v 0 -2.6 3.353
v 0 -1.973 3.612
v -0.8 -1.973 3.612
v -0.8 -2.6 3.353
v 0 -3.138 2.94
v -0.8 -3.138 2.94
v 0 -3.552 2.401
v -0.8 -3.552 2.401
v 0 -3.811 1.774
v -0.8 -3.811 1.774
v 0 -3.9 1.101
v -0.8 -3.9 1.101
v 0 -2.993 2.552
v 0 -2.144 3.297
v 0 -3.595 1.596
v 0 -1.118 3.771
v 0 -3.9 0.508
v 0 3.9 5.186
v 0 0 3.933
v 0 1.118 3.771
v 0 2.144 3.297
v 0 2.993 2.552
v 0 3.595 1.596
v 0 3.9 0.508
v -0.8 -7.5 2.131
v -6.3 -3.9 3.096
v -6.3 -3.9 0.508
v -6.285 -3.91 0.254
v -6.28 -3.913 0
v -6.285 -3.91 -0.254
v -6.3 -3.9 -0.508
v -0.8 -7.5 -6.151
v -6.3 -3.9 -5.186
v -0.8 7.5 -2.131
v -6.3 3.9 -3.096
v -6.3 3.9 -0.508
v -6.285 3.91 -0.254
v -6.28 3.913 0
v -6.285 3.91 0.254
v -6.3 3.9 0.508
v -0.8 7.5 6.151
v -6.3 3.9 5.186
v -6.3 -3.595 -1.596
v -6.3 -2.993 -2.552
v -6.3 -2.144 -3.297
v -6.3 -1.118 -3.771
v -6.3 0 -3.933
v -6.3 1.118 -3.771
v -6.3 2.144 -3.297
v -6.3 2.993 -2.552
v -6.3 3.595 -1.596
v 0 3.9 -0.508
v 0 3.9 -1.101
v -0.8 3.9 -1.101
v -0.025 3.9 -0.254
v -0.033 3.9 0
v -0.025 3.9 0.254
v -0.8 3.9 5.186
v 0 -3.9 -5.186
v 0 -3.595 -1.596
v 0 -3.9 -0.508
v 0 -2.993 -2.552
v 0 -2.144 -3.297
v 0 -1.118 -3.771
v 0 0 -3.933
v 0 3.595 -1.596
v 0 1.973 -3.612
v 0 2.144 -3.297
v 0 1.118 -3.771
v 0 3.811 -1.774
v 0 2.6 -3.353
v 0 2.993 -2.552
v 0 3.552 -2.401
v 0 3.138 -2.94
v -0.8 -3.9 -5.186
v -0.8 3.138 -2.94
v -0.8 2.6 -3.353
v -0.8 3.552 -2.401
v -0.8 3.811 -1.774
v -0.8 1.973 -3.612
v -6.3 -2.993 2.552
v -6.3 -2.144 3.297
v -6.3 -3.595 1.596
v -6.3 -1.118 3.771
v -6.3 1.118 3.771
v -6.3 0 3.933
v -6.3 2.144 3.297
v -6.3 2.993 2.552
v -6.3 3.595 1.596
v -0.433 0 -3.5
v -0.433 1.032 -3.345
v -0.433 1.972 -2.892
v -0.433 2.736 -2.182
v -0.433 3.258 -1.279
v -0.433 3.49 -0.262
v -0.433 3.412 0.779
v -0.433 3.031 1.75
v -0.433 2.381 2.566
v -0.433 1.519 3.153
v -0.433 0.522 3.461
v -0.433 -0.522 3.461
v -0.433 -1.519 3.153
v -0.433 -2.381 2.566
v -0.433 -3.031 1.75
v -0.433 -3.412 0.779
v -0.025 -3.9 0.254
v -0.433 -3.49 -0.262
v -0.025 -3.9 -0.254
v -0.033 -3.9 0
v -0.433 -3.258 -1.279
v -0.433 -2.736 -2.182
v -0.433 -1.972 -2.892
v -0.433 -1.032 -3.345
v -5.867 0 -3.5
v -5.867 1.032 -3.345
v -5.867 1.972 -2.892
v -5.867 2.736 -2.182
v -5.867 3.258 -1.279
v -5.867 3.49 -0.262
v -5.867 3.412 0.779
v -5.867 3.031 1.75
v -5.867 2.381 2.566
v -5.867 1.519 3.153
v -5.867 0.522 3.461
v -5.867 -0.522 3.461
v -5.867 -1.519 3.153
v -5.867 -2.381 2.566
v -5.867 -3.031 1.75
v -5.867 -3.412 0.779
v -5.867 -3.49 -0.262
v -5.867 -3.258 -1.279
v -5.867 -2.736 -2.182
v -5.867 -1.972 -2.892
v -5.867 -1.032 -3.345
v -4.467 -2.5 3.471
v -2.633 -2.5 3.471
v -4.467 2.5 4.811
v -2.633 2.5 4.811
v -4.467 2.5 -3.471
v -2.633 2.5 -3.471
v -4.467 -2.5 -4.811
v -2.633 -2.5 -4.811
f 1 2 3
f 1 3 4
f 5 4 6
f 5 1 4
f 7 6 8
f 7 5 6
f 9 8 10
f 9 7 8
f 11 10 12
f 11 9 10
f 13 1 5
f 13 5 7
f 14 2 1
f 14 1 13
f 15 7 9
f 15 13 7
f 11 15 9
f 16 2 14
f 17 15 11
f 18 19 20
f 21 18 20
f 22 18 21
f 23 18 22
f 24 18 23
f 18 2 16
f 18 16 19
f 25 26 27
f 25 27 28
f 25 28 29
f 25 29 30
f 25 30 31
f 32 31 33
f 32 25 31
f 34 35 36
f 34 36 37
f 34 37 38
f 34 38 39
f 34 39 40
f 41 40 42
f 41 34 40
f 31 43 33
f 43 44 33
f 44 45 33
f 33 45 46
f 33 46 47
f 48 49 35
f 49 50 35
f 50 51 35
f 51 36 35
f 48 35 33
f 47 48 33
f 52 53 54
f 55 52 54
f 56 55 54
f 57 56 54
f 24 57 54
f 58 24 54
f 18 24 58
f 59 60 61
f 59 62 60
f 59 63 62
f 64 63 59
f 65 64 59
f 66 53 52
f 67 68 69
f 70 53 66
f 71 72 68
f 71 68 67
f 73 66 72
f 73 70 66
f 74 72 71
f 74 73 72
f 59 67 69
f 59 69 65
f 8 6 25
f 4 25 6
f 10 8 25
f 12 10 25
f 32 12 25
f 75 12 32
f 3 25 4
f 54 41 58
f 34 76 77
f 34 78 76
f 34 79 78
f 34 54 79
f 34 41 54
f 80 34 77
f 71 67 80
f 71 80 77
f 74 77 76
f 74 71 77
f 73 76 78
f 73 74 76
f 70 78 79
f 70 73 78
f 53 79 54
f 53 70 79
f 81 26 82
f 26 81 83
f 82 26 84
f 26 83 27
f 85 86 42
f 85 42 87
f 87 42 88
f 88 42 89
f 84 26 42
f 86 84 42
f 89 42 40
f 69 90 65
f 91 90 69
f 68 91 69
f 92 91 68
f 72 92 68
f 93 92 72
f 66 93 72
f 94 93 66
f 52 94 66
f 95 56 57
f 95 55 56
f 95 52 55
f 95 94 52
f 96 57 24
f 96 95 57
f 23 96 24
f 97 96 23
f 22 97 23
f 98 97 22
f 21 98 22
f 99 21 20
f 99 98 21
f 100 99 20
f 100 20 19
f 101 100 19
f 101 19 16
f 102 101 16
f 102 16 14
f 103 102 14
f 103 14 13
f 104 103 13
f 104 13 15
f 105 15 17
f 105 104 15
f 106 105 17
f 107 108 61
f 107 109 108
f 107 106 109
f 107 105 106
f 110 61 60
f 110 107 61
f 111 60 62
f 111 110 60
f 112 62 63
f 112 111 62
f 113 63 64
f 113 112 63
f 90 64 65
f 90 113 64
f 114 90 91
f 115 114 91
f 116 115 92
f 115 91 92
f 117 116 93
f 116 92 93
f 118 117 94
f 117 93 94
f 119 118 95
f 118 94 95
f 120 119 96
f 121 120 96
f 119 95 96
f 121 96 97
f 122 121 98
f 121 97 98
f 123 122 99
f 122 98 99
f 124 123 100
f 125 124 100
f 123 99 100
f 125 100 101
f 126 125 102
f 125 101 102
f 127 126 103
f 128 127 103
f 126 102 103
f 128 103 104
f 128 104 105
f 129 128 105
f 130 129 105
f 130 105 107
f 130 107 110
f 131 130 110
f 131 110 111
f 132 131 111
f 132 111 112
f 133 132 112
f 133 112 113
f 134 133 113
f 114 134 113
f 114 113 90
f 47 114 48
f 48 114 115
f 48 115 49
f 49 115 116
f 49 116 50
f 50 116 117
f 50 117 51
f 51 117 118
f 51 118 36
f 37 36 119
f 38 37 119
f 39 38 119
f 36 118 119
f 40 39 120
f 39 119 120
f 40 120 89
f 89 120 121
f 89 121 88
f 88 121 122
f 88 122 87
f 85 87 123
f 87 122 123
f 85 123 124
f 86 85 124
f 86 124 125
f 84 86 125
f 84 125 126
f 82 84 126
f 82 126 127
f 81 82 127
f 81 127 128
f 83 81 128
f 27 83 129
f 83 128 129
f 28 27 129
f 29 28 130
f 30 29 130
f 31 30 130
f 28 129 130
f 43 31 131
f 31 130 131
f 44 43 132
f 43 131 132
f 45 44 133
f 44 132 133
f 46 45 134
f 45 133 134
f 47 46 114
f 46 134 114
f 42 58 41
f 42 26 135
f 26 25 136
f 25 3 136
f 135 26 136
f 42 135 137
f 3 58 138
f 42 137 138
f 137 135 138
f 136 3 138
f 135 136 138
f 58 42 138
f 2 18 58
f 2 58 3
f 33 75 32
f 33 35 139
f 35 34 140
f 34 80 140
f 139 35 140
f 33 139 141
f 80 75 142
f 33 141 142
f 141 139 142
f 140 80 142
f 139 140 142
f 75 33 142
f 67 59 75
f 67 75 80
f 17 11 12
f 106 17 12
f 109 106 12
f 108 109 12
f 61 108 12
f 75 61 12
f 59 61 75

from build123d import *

# Parameters (mm, degrees)
EXTRUDE1_DEPTH       = 0.8
EXTRUDE2_DEPTH       = 5.5
DRAFT1_ANGLE         = -33.206570315
DRAFT2_ANGLE         = -33.206570315
M6_CLEARANCE_HOLE1_D = 7
CHAMFER1_SIZE        = 0.433


with BuildPart() as part:
    # Sketch1 → Extrude1 (new body)
    with BuildSketch(Plane(origin=(0, 0, 0), x_dir=(0, 0, -1), z_dir=(1, 0, 0))):
        with BuildLine():
            Line((1.101052702, 3.9), (-5.186106572, 3.9))
            Line((-5.186106572, 3.9), (-3.612459851, -1.972929517))
            ThreePointArc((-3.612459851, -1.972929517), (-2.683832418, -3.362718685), (-1.101052702, -3.9))
            Line((-1.101052702, -3.9), (5.186106572, -3.9))
            Line((5.186106572, -3.9), (3.612459851, 1.972929517))
            ThreePointArc((3.612459851, 1.972929517), (2.683832418, 3.362718685), (1.101052702, 3.9))
        make_face()
    extrude(amount=-EXTRUDE1_DEPTH)

    # Sketch2 → Extrude2 (add)
    with BuildSketch(Plane.ZY.offset(0.8)):
        with BuildLine():
            Line((2.131485778, -7.5), (-6.150723665, -7.5))
            add(Edge.make_bspline(
                [(-2.131485778, 7.5), (-3.471231741, 2.5), (-4.810977703, -2.5), (-6.150723665, -7.5)],
                knots=[0, 0, 0, 0, 1, 1, 1, 1], degree=3))
            Line((-2.131485778, 7.5), (6.150723665, 7.5))
            add(Edge.make_bspline(
                [(2.131485778, -7.5), (3.471231741, -2.5), (4.810977703, 2.5), (6.150723665, 7.5)],
                knots=[0, 0, 0, 0, 1, 1, 1, 1], degree=3))
        make_face()
    extrude(amount=EXTRUDE2_DEPTH)

    # Draft1
    draft1_faces = [part.faces().sort_by_distance(p)[0] for p in [
        (-3.55, 7.5, 2.009618943),
    ]]
    draft(draft1_faces, Plane(origin=(-0.8, 0, 4.141104722), x_dir=(0, 0, 1), z_dir=(1, 0, 0)), DRAFT1_ANGLE)

    # Draft2
    draft2_faces = [part.faces().sort_by_distance(p)[0] for p in [
        (-3.55, -7.5, -2.009618943),
    ]]
    draft(draft2_faces, Plane(origin=(-0.8, 0, 4.141104722), x_dir=(0, 0, 1), z_dir=(1, 0, 0)), DRAFT2_ANGLE)

    # M6 Clearance Hole1 (through all)
    with Locations(Plane.ZY.offset(6.3)):
        with Locations((0, 0)):
            Hole(M6_CLEARANCE_HOLE1_D / 2)

    # Chamfer1
    # the kernel refuses this chamfer: 0.433 mm, written as the material it takes off along each edge
    with BuildSketch(Plane(origin=(0, 0, 0), x_dir=(0, 0, -1), z_dir=(0, -1, 0))) as chamfer1_piece_1:
        Polygon((3.5 + CHAMFER1_SIZE, 0), (3.5, -CHAMFER1_SIZE), (3.5, 0), align=None)
    revolve(axis=Axis((0, 0, 0), (1, 0, 0)), mode=Mode.SUBTRACT)
    with BuildSketch(Plane(origin=(-6.3, 0, 0), x_dir=(0, 0, -1), z_dir=(0, -1, 0))) as chamfer1_piece_2:
        Polygon((3.5 + CHAMFER1_SIZE, 0), (3.5, CHAMFER1_SIZE), (3.5, 0), align=None)
    revolve(axis=Axis((-6.3, 0, 0), (1, 0, 0)), mode=Mode.SUBTRACT)


solid = part.part
